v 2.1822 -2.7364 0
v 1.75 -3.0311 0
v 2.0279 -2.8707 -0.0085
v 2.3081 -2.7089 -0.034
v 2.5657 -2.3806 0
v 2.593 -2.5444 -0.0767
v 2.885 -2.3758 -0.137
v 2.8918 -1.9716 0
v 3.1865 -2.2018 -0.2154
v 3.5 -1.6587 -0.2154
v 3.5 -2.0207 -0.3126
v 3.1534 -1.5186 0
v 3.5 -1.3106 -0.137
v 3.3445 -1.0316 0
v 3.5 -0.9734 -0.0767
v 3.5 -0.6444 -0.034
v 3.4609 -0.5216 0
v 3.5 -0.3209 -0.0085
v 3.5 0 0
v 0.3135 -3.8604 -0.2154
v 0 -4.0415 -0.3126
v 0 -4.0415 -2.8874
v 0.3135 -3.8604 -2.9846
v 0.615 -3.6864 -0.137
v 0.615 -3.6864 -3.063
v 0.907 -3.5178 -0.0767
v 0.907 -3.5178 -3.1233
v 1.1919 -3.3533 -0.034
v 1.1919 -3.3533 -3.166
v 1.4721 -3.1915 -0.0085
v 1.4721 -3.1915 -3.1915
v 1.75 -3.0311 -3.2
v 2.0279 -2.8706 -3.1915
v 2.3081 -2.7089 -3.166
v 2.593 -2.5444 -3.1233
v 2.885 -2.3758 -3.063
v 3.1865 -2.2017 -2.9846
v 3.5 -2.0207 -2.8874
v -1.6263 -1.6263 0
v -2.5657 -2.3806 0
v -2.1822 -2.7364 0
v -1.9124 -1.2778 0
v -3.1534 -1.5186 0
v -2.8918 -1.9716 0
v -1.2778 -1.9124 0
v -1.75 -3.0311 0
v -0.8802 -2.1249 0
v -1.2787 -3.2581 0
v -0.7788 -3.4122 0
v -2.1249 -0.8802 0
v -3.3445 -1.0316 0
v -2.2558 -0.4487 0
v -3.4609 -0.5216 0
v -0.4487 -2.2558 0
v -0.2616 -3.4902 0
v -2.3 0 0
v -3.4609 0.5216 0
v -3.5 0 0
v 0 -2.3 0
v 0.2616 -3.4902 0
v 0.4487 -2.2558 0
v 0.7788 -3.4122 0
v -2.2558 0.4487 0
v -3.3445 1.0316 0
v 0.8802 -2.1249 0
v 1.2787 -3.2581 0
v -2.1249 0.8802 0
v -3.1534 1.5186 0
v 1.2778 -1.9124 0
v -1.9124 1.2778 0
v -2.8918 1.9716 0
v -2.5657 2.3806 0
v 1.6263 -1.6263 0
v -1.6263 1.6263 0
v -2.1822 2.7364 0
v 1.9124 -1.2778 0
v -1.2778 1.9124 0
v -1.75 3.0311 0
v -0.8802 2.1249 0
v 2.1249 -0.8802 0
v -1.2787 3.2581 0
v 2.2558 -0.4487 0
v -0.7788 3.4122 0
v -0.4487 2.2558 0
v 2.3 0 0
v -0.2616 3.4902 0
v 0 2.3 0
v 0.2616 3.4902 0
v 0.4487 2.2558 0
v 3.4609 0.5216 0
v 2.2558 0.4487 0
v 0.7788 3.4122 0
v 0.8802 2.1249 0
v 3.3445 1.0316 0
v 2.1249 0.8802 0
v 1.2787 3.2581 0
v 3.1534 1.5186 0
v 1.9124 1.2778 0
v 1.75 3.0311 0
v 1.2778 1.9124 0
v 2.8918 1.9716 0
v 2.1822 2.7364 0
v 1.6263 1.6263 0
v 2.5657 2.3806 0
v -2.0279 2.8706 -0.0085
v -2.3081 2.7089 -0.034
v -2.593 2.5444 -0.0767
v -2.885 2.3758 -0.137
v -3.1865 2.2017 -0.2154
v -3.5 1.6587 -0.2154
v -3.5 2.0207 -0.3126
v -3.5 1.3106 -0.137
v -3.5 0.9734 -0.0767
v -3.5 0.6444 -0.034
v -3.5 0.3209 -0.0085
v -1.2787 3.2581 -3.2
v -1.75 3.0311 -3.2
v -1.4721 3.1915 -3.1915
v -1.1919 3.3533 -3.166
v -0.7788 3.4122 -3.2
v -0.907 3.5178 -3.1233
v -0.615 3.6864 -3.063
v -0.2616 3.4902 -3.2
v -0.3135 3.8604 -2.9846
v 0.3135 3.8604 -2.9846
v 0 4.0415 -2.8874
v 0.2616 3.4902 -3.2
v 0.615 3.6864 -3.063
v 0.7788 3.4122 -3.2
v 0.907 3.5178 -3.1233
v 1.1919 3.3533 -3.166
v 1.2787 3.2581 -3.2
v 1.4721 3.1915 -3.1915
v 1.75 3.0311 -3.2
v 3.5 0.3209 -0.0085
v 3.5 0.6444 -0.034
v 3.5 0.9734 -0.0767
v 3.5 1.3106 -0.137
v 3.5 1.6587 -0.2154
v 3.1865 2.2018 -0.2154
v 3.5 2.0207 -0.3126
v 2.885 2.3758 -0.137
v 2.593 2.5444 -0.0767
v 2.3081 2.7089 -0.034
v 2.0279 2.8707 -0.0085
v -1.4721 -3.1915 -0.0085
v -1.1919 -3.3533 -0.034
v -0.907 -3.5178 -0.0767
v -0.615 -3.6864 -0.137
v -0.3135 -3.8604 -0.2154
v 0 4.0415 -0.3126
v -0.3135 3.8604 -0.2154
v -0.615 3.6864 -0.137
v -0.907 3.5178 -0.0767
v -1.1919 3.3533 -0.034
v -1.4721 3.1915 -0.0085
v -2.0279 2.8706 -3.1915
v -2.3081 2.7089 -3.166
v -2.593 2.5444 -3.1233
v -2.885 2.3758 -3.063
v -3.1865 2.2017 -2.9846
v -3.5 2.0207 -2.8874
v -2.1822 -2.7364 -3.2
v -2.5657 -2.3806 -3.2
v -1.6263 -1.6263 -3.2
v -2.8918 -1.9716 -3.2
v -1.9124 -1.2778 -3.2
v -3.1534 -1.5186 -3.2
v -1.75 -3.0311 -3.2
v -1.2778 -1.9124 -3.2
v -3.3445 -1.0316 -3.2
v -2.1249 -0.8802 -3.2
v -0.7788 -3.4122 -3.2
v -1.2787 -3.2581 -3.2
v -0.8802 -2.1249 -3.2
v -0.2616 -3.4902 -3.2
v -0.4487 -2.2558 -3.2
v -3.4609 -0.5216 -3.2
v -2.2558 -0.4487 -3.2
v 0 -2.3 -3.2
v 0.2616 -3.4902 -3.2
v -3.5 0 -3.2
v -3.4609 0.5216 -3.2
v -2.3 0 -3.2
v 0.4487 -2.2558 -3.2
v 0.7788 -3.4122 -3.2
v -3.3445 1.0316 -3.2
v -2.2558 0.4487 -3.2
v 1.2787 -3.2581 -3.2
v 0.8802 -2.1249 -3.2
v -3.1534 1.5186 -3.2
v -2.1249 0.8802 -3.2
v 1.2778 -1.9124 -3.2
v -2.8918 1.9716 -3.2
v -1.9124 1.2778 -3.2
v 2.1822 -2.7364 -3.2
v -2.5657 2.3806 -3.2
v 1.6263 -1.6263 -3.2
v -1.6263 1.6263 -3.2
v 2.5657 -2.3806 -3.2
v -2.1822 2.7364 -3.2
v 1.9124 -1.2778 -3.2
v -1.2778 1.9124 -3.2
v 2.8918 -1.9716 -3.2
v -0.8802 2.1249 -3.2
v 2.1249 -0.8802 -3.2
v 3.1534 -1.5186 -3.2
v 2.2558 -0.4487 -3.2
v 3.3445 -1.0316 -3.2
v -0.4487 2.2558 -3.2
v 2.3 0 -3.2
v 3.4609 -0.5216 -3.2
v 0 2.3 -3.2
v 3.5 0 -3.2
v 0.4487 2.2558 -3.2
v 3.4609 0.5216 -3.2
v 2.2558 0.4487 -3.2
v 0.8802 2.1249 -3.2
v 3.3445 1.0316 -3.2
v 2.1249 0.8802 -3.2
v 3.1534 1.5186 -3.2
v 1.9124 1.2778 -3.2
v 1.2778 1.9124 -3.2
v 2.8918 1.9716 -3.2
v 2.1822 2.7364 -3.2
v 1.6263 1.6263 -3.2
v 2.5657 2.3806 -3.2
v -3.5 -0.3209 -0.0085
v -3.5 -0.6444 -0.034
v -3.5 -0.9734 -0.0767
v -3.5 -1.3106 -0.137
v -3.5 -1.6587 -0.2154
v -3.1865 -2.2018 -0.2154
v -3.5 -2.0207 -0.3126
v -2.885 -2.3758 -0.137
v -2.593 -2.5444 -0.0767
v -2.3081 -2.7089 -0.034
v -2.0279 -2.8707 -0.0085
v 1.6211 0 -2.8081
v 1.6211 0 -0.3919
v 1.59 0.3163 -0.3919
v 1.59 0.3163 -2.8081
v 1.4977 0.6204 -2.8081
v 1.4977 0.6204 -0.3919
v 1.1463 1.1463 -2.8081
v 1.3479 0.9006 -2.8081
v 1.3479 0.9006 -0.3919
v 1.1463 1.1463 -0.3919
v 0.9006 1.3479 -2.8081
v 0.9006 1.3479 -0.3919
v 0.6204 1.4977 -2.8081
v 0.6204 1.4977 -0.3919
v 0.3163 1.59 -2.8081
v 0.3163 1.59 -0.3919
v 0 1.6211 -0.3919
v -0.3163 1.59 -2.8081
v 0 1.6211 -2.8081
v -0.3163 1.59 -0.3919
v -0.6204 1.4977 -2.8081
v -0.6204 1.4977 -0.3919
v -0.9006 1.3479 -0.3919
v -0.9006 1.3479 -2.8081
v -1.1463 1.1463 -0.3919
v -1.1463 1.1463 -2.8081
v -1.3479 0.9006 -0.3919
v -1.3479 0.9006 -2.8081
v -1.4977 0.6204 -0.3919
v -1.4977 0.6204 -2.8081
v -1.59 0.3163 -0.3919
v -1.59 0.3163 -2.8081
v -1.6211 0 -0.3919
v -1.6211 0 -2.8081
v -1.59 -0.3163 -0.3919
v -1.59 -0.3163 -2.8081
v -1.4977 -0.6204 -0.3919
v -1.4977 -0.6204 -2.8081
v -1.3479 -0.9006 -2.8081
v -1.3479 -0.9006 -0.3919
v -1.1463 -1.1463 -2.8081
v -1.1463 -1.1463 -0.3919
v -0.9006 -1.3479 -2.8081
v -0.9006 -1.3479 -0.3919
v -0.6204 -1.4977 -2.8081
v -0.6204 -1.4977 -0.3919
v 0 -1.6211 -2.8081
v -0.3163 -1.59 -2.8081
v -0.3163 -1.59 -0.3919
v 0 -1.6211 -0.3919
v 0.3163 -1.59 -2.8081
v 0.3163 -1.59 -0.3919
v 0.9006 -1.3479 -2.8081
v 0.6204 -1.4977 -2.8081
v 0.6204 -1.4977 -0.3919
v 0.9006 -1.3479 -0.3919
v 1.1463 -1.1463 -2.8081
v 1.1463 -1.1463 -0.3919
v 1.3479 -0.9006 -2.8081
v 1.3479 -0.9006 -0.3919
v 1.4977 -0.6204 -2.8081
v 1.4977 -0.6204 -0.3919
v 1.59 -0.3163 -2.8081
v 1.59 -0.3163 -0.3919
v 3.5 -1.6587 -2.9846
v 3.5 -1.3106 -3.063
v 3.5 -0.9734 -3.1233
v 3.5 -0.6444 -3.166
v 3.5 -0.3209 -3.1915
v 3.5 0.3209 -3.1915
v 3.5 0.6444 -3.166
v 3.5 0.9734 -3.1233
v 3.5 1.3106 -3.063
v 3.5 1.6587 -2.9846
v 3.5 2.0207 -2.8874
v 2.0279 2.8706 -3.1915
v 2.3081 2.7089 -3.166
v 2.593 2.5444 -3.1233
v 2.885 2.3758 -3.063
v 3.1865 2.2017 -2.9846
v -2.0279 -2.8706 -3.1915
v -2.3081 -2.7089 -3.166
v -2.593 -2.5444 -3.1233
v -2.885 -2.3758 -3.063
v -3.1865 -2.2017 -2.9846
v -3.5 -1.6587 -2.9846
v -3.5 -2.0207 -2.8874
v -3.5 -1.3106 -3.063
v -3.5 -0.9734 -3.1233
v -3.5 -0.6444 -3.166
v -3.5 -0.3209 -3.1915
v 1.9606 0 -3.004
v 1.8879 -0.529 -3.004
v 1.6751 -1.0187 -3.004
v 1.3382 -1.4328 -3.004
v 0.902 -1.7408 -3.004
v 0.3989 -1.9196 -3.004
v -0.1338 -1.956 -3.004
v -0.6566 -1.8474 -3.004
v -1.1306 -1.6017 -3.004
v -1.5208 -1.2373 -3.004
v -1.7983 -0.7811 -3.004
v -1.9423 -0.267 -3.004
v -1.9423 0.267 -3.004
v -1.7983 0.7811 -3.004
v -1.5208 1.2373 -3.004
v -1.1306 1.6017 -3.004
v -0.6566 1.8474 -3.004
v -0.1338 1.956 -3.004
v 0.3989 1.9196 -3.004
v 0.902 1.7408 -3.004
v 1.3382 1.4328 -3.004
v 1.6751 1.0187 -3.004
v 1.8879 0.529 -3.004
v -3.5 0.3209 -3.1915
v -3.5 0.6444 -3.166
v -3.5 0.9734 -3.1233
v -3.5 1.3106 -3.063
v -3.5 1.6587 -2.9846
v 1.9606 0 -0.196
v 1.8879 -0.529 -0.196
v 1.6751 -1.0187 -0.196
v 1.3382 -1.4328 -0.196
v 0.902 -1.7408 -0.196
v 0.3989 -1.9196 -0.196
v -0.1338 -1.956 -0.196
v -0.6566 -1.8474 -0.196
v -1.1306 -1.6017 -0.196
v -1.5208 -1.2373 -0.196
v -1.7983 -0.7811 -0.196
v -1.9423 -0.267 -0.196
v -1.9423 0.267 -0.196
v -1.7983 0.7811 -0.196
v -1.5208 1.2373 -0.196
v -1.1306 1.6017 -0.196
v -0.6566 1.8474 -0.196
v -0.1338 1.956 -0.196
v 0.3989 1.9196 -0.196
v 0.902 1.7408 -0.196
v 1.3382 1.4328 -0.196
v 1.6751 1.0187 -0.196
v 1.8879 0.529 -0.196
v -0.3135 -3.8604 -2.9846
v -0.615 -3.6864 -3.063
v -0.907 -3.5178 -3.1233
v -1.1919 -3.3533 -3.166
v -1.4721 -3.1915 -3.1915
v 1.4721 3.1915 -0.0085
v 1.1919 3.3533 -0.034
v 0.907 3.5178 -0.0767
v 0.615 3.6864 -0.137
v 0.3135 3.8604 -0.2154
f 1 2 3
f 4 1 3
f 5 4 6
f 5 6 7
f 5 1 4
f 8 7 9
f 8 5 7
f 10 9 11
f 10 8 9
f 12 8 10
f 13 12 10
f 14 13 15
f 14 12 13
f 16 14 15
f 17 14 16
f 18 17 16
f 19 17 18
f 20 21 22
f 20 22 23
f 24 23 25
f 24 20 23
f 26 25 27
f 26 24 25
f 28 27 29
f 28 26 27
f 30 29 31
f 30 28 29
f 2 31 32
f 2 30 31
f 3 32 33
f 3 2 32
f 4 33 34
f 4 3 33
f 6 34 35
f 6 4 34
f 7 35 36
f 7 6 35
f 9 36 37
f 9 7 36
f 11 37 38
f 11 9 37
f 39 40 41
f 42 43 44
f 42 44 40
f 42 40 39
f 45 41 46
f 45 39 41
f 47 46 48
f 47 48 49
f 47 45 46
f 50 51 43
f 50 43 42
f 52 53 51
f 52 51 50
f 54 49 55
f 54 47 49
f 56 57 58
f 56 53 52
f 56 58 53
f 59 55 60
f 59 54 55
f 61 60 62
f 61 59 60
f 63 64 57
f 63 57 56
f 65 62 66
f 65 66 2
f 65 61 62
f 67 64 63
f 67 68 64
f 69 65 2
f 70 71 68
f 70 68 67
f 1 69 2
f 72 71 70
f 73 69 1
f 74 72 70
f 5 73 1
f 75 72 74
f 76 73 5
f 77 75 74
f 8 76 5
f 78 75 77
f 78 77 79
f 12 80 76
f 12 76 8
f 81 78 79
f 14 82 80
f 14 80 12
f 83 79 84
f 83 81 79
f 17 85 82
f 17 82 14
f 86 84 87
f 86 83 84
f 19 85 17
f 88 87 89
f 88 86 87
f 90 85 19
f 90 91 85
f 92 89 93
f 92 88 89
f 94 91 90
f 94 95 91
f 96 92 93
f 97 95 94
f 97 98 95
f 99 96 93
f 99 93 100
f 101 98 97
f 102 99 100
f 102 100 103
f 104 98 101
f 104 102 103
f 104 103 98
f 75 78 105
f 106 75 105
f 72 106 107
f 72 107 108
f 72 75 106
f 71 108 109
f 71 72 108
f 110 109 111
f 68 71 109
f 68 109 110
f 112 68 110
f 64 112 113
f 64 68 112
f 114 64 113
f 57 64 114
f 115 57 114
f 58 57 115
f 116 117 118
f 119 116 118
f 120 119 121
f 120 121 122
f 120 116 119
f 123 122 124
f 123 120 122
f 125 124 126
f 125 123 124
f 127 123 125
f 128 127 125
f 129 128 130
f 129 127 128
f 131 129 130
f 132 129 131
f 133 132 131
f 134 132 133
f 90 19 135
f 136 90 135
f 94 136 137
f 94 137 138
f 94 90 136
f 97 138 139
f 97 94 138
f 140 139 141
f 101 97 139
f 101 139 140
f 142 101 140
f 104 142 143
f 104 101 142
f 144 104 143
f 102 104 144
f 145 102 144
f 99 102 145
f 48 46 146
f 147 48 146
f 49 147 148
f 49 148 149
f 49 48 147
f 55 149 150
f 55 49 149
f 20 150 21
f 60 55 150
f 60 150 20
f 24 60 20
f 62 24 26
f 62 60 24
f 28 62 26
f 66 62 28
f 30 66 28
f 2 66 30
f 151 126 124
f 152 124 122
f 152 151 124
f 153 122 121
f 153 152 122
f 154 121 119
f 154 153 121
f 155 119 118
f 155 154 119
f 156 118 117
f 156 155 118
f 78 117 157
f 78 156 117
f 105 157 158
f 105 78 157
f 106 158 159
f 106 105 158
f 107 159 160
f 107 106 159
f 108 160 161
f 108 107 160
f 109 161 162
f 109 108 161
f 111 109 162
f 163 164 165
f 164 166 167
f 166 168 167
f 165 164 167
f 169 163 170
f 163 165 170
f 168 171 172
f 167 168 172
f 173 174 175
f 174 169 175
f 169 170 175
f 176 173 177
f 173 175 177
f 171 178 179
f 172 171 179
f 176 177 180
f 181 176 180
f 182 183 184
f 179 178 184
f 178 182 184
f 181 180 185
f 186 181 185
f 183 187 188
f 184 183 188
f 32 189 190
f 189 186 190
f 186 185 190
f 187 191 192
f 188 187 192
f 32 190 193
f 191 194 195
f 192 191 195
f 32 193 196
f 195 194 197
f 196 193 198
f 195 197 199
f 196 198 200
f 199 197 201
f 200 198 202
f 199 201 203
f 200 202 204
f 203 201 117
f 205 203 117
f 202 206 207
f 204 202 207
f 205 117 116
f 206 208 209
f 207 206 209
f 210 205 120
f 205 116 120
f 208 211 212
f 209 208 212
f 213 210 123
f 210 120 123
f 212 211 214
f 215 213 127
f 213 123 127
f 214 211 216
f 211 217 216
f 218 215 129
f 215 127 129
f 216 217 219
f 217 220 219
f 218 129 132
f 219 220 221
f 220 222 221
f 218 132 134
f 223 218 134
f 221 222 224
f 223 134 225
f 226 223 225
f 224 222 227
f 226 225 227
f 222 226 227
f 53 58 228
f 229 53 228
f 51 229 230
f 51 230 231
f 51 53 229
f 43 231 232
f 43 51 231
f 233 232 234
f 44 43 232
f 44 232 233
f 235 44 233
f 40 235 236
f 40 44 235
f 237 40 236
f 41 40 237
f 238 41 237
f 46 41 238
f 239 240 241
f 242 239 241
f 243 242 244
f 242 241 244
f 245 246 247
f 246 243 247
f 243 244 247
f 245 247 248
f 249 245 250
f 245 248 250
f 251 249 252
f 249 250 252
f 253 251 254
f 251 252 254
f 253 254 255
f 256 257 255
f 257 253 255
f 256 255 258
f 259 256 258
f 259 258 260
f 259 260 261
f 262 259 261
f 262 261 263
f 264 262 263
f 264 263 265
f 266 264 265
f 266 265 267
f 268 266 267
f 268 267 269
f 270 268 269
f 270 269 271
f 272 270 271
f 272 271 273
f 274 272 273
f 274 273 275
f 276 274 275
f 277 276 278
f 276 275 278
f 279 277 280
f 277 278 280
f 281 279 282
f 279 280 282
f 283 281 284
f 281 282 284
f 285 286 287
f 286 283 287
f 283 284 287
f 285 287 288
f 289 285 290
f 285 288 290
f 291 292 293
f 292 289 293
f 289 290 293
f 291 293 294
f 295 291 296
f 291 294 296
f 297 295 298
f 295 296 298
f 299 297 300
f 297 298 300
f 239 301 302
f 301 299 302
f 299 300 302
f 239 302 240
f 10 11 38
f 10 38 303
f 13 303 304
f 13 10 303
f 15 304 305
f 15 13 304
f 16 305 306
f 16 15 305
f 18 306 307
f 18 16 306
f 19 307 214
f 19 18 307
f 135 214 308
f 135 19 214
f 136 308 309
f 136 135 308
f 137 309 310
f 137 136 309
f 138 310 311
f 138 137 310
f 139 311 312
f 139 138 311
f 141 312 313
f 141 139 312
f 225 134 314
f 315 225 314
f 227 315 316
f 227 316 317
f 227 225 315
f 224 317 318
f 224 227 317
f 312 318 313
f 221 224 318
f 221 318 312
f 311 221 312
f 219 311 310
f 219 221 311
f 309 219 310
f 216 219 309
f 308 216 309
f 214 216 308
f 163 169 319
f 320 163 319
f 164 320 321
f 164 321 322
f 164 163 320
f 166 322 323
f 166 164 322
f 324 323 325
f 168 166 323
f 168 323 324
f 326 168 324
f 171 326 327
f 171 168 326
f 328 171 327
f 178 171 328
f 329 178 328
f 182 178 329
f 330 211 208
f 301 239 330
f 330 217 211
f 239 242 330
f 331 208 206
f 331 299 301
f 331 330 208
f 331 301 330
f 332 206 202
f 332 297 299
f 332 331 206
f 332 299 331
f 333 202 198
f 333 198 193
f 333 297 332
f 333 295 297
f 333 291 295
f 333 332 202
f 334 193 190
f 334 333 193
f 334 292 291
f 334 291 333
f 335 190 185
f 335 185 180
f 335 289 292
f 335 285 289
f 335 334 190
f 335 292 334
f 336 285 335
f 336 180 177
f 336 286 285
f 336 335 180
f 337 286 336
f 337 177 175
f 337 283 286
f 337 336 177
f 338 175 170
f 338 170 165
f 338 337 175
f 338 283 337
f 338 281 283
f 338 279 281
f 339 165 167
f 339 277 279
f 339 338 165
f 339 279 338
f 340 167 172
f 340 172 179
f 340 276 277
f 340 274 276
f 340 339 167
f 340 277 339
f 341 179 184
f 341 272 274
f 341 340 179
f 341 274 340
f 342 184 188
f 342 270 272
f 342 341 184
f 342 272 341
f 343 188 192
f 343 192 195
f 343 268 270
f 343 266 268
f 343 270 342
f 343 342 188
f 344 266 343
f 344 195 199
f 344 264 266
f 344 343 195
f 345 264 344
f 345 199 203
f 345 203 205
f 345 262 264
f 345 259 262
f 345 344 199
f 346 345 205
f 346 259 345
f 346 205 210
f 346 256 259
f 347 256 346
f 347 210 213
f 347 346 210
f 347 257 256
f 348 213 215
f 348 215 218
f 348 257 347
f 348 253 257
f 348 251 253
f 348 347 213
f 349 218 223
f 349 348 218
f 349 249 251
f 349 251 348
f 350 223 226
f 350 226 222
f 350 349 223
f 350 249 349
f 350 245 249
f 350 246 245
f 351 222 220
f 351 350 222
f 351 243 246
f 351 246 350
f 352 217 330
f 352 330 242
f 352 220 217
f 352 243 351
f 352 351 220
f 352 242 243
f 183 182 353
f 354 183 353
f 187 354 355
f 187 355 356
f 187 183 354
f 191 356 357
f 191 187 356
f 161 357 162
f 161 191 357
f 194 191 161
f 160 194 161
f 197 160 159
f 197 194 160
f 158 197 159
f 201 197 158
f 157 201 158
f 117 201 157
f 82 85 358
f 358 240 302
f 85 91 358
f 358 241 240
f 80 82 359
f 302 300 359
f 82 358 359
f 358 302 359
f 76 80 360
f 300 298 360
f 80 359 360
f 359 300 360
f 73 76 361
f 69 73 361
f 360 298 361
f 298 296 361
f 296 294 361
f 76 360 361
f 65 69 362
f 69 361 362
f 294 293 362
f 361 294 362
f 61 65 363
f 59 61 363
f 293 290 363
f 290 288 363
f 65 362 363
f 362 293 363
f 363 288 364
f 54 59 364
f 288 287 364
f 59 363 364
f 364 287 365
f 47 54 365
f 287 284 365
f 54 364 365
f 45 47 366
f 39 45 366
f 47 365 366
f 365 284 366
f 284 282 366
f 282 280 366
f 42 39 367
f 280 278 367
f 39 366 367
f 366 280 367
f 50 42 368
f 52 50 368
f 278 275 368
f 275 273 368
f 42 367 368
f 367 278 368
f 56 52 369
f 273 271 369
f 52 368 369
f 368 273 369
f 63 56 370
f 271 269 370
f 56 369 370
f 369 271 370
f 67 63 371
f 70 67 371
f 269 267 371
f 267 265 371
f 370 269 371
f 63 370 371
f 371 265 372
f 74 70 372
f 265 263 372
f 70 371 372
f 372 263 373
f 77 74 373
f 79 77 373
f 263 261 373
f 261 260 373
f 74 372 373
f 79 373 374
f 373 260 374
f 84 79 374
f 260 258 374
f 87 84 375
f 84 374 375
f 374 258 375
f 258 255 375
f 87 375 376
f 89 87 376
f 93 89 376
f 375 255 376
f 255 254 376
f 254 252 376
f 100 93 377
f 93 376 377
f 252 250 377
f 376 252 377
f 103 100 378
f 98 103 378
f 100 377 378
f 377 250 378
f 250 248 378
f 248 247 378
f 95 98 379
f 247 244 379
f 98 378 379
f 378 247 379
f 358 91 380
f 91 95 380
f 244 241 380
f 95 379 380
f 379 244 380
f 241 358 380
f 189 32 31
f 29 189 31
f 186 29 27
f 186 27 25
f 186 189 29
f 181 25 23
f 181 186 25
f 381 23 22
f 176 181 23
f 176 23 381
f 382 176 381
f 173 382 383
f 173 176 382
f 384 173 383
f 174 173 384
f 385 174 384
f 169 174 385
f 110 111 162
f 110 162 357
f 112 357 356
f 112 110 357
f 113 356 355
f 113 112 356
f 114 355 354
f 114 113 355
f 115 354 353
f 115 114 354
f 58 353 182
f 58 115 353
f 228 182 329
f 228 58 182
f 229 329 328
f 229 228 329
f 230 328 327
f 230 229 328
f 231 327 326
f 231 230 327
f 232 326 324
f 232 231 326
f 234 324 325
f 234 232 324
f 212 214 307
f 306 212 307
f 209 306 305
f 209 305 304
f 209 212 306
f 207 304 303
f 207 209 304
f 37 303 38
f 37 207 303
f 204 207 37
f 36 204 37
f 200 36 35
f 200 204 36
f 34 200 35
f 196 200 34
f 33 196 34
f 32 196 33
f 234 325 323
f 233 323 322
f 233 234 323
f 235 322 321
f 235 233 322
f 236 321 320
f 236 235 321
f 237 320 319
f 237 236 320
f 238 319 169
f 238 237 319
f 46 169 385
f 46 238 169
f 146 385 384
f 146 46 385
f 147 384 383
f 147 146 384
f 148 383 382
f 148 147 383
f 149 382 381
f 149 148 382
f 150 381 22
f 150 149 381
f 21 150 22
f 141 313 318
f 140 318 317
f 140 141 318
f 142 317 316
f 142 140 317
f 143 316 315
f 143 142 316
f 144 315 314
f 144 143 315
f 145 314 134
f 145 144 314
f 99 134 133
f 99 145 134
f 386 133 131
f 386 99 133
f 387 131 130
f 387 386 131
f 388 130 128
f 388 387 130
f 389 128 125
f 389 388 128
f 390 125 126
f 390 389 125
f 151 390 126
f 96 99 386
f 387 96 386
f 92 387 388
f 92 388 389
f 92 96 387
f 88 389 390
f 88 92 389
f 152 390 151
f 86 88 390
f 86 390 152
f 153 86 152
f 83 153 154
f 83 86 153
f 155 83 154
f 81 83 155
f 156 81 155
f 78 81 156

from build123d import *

# Parameters (mm, degrees)
SKETCH_3_R          = 1.621125
EXTRUDE_1_DEPTH     = 3.2
SKETCH_5_R          = 5.745
SKETCH_5_R_2        = 3.5
CUT_EXTRUDE_1_DEPTH = 0.64
CUT_EXTRUDE_1_DRAFT = -60
SKETCH_7_R          = 5.745
SKETCH_7_R_2        = 3.5
CUT_EXTRUDE_2_DEPTH = 0.64
CUT_EXTRUDE_2_DRAFT = -60


with BuildPart() as part:
    # 草图3 → 凸台-拉伸1 (new body)
    with BuildSketch(Plane.XY):
        Polygon((0, 4.041451884), (-3.5, 2.020725942), (-3.5, -2.020725942), (0, -4.041451884), (3.5, -2.020725942), (3.5, 2.020725942), align=None)
        Circle(SKETCH_3_R, mode=Mode.SUBTRACT)
    extrude(amount=-EXTRUDE_1_DEPTH)

    # 草图4 → 切除-旋转1 (revolve, cut)
    with BuildSketch(Plane(origin=(0, 0, 0), x_dir=(0, 0, -1), z_dir=(1, 0, 0)), mode=Mode.PRIVATE) as cut_revolve_1_sk:
        Polygon((0, 2.3), (0.391948664, 1.621125), (0.391948664, 0), (0, 0), align=None)
        Polygon((3.2, 0), (3.2, 2.3), (2.808051336, 1.621125), (2.808051336, 0), align=None)
    revolve(cut_revolve_1_sk.sketch.rotate(Axis((0, 0, 0), (0, 0, -1)), 90), axis=Axis((0, 0, 0), (0, 0, -1)), mode=Mode.SUBTRACT)


with BuildPart() as cut_extrude_1_tool:
    # 草图5 → 切除-拉伸1 (with draft: the straight prism first)
    with BuildSketch(Plane.XY):
        Circle(SKETCH_5_R)
        Circle(SKETCH_5_R_2, mode=Mode.SUBTRACT)
    extrude(amount=-CUT_EXTRUDE_1_DEPTH)
    # 切除-拉伸1: the draft: its side faces are tilted about the plane it starts from
    cut_extrude_1_sides = [cut_extrude_1_tool.faces().sort_by_distance(p)[0] for p in [
        (-5.745, 0, -0.32),
        (-3.5, 0, -0.32),
    ]]
    draft(cut_extrude_1_sides, Plane.XY, CUT_EXTRUDE_1_DRAFT)


with BuildPart() as part_1:
    add(part.part)

    # 切除-拉伸1: cut by cut_extrude_1_tool
    add(cut_extrude_1_tool.part, mode=Mode.SUBTRACT)


with BuildPart() as cut_extrude_2_tool:
    # 草图7 → 切除-拉伸2 (with draft: the straight prism first)
    with BuildSketch(Plane(origin=(0, 0, -3.2), x_dir=(-1, 0, 0), z_dir=(0, 0, -1))):
        Circle(SKETCH_7_R)
        Circle(SKETCH_7_R_2, mode=Mode.SUBTRACT)
    extrude(amount=-CUT_EXTRUDE_2_DEPTH)
    # 切除-拉伸2: the draft: its side faces are tilted about the plane it starts from
    cut_extrude_2_sides = [cut_extrude_2_tool.faces().sort_by_distance(p)[0] for p in [
        (5.745, 0, -2.88),
        (3.5, 0, -2.88),
    ]]
    draft(cut_extrude_2_sides, Plane(origin=(0, 0, -3.2), x_dir=(-1, 0, 0), z_dir=(0, 0, -1)), CUT_EXTRUDE_2_DRAFT)


with BuildPart() as part_2:
    add(part_1.part)

    # 切除-拉伸2: cut by cut_extrude_2_tool
    add(cut_extrude_2_tool.part, mode=Mode.SUBTRACT)


solid = part_2.part
